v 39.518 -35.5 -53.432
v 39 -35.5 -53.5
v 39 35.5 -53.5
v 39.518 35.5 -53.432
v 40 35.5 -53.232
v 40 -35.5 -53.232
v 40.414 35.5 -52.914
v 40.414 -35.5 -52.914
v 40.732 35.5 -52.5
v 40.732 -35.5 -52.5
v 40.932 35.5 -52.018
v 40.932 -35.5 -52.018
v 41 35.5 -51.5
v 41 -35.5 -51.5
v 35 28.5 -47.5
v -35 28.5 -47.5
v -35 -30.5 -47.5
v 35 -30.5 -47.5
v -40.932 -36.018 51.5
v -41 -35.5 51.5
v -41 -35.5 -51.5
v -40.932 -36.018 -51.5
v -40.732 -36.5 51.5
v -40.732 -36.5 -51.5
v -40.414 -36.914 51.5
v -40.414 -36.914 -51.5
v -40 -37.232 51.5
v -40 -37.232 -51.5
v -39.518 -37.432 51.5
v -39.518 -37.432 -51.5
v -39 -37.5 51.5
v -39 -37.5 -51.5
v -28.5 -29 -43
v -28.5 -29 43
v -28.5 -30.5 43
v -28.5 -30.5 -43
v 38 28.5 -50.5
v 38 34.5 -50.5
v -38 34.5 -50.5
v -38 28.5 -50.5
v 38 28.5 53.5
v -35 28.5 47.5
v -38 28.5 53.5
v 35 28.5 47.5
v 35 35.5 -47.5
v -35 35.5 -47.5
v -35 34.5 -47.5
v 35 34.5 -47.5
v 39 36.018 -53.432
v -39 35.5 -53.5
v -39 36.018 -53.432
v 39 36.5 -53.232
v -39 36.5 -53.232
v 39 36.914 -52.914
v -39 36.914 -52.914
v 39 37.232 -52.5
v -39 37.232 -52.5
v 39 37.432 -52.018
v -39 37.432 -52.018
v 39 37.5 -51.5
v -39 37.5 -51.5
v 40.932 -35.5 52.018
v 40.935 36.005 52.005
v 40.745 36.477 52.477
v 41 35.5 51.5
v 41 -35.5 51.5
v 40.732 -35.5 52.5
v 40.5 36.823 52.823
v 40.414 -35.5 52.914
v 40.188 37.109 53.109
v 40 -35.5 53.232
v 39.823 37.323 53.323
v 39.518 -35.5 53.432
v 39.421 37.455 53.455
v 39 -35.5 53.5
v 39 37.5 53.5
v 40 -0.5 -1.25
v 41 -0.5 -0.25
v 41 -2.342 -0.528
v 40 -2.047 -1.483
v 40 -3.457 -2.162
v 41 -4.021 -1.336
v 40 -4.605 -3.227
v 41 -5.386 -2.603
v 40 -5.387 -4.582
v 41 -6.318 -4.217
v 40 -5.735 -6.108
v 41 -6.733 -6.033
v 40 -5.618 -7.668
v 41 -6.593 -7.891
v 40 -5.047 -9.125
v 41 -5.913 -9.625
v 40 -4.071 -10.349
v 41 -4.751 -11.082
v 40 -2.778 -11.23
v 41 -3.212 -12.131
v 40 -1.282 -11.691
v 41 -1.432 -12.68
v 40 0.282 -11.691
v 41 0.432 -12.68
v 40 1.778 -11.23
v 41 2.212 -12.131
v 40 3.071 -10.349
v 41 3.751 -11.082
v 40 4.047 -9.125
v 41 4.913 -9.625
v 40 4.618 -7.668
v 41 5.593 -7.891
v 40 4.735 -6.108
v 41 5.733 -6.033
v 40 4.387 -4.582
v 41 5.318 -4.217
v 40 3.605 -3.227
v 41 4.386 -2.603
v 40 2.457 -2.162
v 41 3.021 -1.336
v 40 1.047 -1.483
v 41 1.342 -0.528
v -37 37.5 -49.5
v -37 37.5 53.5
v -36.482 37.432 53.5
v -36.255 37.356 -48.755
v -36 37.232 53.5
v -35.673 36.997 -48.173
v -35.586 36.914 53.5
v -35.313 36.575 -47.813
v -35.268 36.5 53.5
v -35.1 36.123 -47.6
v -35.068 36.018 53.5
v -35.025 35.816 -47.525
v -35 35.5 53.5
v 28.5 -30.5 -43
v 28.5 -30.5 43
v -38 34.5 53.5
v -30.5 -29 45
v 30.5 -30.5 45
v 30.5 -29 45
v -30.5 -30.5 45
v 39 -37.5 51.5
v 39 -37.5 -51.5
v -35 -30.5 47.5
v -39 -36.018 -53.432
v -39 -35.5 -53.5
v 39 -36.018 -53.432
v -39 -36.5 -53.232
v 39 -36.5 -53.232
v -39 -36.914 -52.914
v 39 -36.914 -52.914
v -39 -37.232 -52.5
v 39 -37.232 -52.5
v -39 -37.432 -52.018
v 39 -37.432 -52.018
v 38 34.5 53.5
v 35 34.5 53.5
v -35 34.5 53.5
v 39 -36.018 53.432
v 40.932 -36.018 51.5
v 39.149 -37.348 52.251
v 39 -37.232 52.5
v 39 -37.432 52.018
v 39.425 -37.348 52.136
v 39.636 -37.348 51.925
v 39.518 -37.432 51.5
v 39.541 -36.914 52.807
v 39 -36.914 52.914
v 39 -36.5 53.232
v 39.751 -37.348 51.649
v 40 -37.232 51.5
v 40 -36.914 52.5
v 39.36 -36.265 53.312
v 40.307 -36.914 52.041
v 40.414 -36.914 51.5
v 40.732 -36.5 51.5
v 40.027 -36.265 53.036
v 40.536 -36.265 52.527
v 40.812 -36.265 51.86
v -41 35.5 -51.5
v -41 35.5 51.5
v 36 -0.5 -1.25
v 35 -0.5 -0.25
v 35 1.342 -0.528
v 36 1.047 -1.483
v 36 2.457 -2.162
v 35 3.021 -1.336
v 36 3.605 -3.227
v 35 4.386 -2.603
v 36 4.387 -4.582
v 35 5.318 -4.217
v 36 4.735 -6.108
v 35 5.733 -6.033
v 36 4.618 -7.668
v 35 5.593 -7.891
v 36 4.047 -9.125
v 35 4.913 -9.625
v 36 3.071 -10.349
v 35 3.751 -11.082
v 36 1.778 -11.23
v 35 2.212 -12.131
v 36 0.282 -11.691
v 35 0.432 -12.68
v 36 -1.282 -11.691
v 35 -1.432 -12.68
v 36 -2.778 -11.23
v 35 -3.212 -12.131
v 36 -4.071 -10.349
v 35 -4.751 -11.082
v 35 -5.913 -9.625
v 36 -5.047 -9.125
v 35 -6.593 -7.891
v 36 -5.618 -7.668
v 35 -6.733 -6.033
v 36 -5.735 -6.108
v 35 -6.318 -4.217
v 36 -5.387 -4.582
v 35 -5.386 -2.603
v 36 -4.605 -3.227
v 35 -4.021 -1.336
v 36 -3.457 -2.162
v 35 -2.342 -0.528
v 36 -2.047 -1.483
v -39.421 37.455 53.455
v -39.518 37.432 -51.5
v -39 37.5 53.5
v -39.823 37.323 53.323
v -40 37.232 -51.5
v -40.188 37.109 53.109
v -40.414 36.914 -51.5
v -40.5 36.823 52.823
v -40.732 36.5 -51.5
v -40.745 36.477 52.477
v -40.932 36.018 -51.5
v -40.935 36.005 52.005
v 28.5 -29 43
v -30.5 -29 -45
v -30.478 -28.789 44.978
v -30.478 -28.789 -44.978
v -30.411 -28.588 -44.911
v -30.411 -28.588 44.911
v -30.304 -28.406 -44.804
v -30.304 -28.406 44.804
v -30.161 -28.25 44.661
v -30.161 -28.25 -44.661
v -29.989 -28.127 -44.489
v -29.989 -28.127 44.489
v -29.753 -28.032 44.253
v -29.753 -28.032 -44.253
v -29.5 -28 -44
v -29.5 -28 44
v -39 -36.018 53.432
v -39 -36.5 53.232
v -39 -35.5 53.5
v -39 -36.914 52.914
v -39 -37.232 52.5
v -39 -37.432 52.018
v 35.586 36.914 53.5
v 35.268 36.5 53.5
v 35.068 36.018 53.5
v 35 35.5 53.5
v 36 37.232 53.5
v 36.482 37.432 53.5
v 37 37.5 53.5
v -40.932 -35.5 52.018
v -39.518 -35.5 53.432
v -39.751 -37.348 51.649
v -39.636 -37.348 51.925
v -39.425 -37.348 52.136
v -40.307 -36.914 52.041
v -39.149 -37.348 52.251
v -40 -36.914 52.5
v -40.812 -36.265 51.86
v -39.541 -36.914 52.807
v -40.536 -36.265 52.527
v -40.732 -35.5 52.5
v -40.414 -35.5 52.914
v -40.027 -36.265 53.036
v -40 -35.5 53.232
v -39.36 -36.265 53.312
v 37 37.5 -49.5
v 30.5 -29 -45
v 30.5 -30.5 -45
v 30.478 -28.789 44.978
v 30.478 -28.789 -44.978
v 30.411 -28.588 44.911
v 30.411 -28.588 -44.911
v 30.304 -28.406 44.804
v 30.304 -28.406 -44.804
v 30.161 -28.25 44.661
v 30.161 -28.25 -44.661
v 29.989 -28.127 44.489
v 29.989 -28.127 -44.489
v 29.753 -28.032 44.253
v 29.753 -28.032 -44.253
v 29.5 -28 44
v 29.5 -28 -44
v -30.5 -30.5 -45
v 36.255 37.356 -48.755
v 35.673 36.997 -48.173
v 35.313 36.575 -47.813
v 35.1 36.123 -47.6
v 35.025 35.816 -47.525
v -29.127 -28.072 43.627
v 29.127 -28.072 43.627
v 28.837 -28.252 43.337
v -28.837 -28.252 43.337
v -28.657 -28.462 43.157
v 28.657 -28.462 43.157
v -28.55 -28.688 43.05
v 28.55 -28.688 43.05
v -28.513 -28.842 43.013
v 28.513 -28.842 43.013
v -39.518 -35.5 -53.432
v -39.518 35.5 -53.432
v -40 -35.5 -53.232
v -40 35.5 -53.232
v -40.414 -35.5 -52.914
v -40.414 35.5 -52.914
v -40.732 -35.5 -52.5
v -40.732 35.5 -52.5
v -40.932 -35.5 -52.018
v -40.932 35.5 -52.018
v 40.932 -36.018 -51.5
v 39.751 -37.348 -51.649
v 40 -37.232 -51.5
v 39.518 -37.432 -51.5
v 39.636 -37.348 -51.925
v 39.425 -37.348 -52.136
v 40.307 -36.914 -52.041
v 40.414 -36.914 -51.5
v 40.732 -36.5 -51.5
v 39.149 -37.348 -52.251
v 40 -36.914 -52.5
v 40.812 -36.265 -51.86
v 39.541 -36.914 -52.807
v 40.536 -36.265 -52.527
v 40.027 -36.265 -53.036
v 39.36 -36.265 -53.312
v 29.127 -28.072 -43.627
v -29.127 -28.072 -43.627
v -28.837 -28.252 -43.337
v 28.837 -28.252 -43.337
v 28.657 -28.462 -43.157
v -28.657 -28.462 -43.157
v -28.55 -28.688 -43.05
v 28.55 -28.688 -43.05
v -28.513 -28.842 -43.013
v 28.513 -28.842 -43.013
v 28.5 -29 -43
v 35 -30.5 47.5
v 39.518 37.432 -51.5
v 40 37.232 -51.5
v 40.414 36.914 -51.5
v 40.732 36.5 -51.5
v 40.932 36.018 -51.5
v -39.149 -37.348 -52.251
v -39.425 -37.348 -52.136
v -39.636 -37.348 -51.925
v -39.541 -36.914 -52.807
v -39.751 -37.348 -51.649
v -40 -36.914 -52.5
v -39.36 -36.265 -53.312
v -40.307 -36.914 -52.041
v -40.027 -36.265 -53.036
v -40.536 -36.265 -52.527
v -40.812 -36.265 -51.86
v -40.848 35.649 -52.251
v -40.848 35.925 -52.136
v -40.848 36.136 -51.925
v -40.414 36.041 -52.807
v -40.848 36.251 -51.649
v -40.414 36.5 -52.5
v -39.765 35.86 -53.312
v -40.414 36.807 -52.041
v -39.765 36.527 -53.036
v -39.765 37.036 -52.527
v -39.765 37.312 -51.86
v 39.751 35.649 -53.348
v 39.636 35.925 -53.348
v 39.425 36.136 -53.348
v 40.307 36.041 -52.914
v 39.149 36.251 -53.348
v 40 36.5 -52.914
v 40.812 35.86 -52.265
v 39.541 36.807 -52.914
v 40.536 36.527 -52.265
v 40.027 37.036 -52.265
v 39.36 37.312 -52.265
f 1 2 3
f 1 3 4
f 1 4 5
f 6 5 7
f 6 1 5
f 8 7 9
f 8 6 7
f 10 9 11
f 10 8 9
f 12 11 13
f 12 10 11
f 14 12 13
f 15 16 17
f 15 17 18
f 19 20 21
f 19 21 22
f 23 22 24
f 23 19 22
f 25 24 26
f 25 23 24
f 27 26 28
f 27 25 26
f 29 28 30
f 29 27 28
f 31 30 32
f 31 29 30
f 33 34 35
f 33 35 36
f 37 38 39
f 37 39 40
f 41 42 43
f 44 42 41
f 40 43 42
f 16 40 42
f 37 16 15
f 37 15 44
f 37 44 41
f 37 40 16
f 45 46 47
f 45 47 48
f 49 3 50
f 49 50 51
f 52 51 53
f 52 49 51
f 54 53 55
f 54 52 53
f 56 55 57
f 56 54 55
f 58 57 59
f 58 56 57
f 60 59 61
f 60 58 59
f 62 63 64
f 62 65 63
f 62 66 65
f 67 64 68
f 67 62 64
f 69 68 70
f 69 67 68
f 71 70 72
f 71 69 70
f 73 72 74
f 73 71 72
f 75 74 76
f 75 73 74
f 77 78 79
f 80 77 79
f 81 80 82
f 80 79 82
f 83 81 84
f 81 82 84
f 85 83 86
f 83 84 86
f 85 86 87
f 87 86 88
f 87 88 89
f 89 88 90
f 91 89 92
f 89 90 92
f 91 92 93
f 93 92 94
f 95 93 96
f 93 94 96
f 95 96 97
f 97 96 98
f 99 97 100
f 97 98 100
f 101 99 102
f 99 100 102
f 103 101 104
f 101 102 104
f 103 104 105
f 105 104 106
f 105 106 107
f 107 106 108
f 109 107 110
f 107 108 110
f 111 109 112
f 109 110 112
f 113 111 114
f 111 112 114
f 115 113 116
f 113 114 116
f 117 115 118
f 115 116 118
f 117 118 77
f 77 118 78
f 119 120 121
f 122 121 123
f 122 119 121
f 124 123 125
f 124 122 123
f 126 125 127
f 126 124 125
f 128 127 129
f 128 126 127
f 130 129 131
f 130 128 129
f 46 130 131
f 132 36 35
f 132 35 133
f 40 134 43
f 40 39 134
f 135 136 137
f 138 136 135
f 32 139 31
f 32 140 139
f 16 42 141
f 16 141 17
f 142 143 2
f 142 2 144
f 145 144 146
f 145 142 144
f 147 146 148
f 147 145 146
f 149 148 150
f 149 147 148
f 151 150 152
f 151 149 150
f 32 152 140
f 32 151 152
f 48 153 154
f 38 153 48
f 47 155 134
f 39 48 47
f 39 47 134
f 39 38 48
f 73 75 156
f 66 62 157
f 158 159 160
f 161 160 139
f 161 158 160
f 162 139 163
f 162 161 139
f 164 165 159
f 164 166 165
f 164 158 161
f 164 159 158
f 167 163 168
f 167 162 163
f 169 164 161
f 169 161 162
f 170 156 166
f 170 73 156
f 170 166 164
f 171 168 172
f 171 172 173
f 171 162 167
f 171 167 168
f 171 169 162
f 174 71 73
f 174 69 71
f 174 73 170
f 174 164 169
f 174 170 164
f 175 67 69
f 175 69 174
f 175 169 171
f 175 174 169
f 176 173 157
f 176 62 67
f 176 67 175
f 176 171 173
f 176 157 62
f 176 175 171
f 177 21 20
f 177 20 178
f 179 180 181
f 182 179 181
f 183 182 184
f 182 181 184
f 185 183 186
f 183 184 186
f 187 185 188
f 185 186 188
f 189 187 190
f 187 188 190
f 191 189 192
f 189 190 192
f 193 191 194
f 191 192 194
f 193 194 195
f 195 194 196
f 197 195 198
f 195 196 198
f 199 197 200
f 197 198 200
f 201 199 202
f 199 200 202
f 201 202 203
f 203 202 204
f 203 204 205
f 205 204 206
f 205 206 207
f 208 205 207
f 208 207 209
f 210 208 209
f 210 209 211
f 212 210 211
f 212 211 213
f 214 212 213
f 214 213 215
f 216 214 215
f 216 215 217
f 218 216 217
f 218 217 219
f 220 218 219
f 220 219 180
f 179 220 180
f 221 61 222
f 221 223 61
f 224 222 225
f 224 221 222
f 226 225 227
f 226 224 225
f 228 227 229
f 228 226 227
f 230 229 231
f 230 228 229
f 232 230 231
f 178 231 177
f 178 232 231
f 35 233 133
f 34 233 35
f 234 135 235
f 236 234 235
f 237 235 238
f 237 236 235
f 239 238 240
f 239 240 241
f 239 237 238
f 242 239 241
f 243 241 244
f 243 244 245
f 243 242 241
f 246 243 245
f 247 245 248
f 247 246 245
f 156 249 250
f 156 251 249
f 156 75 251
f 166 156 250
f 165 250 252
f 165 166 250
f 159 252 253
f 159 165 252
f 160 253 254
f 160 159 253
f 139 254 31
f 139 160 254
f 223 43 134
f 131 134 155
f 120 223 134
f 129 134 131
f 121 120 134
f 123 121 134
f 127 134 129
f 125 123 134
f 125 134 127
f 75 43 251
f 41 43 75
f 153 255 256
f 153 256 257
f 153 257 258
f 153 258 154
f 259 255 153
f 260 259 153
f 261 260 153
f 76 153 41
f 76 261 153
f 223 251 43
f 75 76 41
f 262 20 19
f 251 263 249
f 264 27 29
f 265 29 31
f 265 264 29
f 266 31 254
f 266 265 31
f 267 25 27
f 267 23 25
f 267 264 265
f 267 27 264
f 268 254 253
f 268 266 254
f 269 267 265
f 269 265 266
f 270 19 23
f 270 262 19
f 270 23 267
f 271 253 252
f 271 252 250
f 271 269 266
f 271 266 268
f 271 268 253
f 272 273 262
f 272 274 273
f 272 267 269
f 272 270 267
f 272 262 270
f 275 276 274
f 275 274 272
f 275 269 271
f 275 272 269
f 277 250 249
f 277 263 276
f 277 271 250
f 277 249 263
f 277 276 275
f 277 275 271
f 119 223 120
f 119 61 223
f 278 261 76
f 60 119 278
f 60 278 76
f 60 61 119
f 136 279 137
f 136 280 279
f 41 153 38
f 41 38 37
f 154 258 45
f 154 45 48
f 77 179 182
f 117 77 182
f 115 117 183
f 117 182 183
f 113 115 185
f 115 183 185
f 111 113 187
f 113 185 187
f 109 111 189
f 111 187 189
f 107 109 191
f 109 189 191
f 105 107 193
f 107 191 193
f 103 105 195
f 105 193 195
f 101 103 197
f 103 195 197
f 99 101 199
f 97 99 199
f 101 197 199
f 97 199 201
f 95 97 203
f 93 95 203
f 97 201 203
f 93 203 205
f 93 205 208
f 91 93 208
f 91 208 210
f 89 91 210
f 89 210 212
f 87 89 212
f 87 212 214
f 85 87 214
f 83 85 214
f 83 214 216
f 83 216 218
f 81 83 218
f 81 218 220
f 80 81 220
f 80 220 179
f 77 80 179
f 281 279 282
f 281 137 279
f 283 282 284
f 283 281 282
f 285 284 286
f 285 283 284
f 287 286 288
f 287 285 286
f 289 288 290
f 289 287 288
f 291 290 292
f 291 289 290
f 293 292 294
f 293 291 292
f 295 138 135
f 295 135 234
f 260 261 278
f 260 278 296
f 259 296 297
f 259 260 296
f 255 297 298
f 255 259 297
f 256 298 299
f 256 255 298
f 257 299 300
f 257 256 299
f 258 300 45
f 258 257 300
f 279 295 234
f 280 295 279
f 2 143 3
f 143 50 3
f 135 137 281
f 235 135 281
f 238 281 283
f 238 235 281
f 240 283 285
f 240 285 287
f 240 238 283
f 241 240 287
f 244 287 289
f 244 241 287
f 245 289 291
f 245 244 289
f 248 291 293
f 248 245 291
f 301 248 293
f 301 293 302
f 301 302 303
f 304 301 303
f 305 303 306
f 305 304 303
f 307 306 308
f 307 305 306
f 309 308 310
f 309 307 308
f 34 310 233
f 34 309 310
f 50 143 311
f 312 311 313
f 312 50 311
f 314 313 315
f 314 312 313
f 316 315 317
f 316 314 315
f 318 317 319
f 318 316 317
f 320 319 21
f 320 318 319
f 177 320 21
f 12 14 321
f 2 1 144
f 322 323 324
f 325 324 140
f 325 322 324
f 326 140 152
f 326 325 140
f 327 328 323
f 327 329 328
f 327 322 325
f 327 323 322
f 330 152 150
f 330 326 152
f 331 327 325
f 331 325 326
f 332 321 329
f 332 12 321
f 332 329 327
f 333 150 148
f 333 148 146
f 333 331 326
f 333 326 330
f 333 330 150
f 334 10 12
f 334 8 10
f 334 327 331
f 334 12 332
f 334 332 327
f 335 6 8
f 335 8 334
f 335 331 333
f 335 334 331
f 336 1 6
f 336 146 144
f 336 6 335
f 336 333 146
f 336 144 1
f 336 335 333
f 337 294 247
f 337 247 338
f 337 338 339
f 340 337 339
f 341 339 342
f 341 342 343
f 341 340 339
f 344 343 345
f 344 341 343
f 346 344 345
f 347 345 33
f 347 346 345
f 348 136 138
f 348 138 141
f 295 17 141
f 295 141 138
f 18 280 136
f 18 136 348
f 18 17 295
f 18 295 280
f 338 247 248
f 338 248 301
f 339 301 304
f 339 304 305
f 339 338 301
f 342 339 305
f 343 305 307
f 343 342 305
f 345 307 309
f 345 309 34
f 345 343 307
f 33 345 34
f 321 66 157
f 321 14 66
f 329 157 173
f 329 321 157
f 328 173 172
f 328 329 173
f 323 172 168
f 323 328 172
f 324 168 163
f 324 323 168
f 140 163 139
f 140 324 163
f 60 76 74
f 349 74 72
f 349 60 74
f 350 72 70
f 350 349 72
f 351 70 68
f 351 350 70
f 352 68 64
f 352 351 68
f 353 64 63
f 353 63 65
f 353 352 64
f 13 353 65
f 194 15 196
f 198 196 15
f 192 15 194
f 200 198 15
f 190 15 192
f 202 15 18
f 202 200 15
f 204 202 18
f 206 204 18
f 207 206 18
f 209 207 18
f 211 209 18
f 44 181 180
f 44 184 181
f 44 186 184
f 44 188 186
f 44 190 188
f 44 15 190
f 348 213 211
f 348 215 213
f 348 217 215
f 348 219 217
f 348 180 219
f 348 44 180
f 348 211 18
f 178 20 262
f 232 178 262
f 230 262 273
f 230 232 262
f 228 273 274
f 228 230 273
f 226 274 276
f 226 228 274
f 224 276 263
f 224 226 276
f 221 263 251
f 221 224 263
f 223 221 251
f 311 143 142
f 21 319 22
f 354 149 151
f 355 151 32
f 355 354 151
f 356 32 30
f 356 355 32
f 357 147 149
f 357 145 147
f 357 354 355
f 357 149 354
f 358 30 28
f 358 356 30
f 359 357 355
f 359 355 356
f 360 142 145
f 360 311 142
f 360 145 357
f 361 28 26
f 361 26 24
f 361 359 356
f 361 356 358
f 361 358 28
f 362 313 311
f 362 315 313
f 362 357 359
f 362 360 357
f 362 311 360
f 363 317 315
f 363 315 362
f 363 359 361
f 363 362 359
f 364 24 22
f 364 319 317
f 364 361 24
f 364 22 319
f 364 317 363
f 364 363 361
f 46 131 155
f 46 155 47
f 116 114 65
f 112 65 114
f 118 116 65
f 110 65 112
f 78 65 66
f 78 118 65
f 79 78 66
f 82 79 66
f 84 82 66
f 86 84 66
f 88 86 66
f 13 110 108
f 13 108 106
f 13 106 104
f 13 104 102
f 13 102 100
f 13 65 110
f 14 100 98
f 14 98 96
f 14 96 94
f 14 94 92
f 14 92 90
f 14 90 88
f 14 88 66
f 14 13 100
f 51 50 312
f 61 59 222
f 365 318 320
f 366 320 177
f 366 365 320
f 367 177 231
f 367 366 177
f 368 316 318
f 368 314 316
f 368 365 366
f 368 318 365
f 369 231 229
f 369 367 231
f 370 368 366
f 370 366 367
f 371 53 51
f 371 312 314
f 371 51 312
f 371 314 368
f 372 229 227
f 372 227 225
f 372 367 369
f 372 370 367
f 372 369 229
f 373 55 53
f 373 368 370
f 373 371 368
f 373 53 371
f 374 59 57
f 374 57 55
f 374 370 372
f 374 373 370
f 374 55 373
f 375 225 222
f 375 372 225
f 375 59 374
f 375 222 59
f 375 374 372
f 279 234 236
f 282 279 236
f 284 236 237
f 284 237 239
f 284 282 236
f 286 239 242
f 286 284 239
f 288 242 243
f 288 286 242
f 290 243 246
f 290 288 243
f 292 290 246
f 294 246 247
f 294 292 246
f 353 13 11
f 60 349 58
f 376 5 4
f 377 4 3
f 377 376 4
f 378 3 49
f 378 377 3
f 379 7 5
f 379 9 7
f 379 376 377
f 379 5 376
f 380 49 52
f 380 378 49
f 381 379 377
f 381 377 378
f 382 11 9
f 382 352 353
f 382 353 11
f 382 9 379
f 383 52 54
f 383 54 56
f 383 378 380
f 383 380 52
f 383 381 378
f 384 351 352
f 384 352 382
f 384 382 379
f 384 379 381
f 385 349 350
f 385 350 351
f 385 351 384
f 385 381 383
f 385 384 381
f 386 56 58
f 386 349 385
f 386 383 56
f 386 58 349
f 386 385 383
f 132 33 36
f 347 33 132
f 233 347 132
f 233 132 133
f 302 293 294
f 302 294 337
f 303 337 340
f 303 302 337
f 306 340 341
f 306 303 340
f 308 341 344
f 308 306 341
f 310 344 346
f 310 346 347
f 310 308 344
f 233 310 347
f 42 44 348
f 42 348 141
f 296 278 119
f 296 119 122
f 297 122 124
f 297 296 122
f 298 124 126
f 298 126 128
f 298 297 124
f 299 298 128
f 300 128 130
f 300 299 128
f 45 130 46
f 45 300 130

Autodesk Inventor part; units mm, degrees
ref_plane "XZ Plane" through (0, 0, 0) normal (0, 1, 0) x (-1, 0, 0)
sketch "Sketch1" plane through (0, 0, 0) normal (0, 0, 1) x (1, 0, 0)
  line L0 (-41, 37.5) -> (41, 37.5)
  line L1 (41, 37.5) -> (41, -37.5)
  line L2 (41, -37.5) -> (-41, -37.5)
  line L3 (-41, -37.5) -> (-41, 37.5)
  point P0 (0, 0)
  point P1 (0, 37.5)
  point P2 (-41, 0)
  dimension "d0" = 82
  dimension "d1" = 75
extrude "Extrusion1" add sketch "Sketch1" along normal mid plane 107
sketch "Sketch2" plane through (-41, 37.5, 53.5) normal (0, 1, 0) x (1, 0, 0)
  line L0 (0, 107) -> (82, 107) projected
  line L1 (6, 101) -> (76, 101)
  line L2 (76, 101) -> (76, 6)
  line L3 (76, 6) -> (6, 6)
  line L4 (6, 6) -> (6, 101)
  line L5 (0, 107) -> (0, 0) projected
  point P0 (41, 53.5)
  point P1 (41, 101)
  point P2 (41, 107)
  point P3 (6, 53.5)
  point P4 (0, 53.5)
  dimension "d4" = 95
  dimension "d5" = 70
extrude "Extrusion2" cut sketch "Sketch2" against normal blind 68
sketch "Sketch3" plane through (0, 0, 53.5) normal (0, 0, 1) x (1, 0, 0)
  line L0 (-35, 37.5) -> (35, 37.5)
  line L1 (35, 37.5) -> (35, 28.5)
  line L2 (35, 28.5) -> (-35, 28.5)
  line L3 (-35, 28.5) -> (-35, 37.5)
  line L4 (41, 37.5) -> (-41, 37.5) projected
  point P0 (0, 0)
  point P1 (0, 37.5)
  dimension "d14" = 70
  dimension "d15" = 9
extrude "Extrusion3" cut sketch "Sketch3" against normal up to surface (6 mm away)
ref_plane "Work Plane1" through (0, 0, 0) normal (0, 0, 1) x (1, 0, 0)
sketch "Sketch5" plane through (0, 0, 0) normal (0, 0, 1) x (1, 0, 0)
  line L0 (-35, 37.5) -> (-35, -30.5) projected
  line L1 (-38, 34.5) -> (-35, 34.5)
  line L2 (-35, 34.5) -> (-35, 28.5)
  line L3 (-35, 28.5) -> (-38, 28.5)
  line L4 (-38, 28.5) -> (-38, 34.5)
  point P0 (0, 0)
  dimension "d21" = 3
  dimension "d22" = 6
  dimension "d23" = 3
sketch3d "3D Sketch1"
  line L0 (-35, 37.5, 53.5) -> (-35, 37.5, -47.5)
  line L1 (-35, 37.5, -47.5) -> (35, 37.5, -47.5)
  line L2 (35, 37.5, -47.5) -> (35, 37.5, 53.5)
sweep "Sweep1" cut profiles "Sketch5" path "3D Sketch1"
ref_plane "Work Plane2" through (0, 0, 0) normal (1, 0, 0) x (0, 1, 0)
fillet "Fillet1" radius 2 10 edges at (41, 37.5, 0) (0, 37.5, -53.5) (-41, 37.5, 0) (41, 0, -53.5) (41, 0, 53.5) (-41, 0, 53.5) (-41, 0, -53.5) (35, 37.5, 3) (0, 37.5, -47.5) (-35, 37.5, 3)
fillet "Fillet2" radius 2 8 edges at (40.4142, -37.5, 52.9142) (0, -37.5, 53.5) (-40.4142, -37.5, 52.9142) (-41, -37.5, 0) (-40.4142, -37.5, -52.9142) (0, -37.5, -53.5) (40.4142, -37.5, -52.9142) (41, -37.5, 0)
sketch "Sketch9" plane through (-41, -30.5, 53.5) normal (0, 1, 0) x (1, 0, 0)
  line L0 (10.5, 98.5) -> (71.5, 98.5)
  line L1 (71.5, 98.5) -> (71.5, 8.5)
  line L2 (71.5, 8.5) -> (10.5, 8.5)
  line L3 (10.5, 8.5) -> (10.5, 98.5)
  point P0 (41, 53.5)
  point P1 (41, 96.5)
  point P2 (12.5, 53.5)
  point P3 (10.5, 53.5)
  point P4 (41, 98.5)
  dimension "d48" = 90
  dimension "d49" = 61
extrude "Extrusion5" add sketch "Sketch9" along normal blind 2.5
sketch "Sketch10" plane through (-41, -28, 53.5) normal (0, 1, 0) x (1, 0, 0)
  line L0 (71.5, 98.5) -> (10.5, 98.5) projected
  line L1 (12.5, 96.5) -> (69.5, 96.5)
  line L2 (69.5, 96.5) -> (69.5, 10.5)
  line L3 (69.5, 10.5) -> (12.5, 10.5)
  line L4 (12.5, 10.5) -> (12.5, 96.5)
  point P0 (41, 53.5)
  point P1 (12.5, 53.5)
  point P2 (41, 96.5)
  dimension "d52" = 57
  dimension "d53" = 86
extrude "Extrusion6" cut sketch "Sketch10" against normal up to surface (2.5 mm away)
fillet "Fillet3" radius 1 8 edges at (0, -28, -45) (0, -28, -43) (-30.5, -28, 0) (-28.5, -28, 0) (0, -28, 43) (0, -28, 45) (28.5, -28, 0) (30.5, -28, 0)
sketch "Sketch12" plane through (35, -30.5, -47.5) normal (-1, 0, 0) x (0, 0, 1)
  circle A0 centre (41, 30) radius 5.25
  line L0 (4.5, 1.5) -> (4.5, 0) projected
  line L1 (90.5, 0) -> (4.5, 0) projected
  point P0 (47.5, 30.5)
  dimension "d64" = 36.5
  dimension "d65" = 10.5
  dimension "d66" = 30
extrude "Extrusion7" cut sketch "Sketch12" against normal up to surface (6 mm away)
chamfer "Chamfer1" distance 1 angle 45 1 edges at (41, -0.5, -11.75)
chamfer "Chamfer2" distance 1 angle 45 1 edges at (35, -0.5, -11.75)
